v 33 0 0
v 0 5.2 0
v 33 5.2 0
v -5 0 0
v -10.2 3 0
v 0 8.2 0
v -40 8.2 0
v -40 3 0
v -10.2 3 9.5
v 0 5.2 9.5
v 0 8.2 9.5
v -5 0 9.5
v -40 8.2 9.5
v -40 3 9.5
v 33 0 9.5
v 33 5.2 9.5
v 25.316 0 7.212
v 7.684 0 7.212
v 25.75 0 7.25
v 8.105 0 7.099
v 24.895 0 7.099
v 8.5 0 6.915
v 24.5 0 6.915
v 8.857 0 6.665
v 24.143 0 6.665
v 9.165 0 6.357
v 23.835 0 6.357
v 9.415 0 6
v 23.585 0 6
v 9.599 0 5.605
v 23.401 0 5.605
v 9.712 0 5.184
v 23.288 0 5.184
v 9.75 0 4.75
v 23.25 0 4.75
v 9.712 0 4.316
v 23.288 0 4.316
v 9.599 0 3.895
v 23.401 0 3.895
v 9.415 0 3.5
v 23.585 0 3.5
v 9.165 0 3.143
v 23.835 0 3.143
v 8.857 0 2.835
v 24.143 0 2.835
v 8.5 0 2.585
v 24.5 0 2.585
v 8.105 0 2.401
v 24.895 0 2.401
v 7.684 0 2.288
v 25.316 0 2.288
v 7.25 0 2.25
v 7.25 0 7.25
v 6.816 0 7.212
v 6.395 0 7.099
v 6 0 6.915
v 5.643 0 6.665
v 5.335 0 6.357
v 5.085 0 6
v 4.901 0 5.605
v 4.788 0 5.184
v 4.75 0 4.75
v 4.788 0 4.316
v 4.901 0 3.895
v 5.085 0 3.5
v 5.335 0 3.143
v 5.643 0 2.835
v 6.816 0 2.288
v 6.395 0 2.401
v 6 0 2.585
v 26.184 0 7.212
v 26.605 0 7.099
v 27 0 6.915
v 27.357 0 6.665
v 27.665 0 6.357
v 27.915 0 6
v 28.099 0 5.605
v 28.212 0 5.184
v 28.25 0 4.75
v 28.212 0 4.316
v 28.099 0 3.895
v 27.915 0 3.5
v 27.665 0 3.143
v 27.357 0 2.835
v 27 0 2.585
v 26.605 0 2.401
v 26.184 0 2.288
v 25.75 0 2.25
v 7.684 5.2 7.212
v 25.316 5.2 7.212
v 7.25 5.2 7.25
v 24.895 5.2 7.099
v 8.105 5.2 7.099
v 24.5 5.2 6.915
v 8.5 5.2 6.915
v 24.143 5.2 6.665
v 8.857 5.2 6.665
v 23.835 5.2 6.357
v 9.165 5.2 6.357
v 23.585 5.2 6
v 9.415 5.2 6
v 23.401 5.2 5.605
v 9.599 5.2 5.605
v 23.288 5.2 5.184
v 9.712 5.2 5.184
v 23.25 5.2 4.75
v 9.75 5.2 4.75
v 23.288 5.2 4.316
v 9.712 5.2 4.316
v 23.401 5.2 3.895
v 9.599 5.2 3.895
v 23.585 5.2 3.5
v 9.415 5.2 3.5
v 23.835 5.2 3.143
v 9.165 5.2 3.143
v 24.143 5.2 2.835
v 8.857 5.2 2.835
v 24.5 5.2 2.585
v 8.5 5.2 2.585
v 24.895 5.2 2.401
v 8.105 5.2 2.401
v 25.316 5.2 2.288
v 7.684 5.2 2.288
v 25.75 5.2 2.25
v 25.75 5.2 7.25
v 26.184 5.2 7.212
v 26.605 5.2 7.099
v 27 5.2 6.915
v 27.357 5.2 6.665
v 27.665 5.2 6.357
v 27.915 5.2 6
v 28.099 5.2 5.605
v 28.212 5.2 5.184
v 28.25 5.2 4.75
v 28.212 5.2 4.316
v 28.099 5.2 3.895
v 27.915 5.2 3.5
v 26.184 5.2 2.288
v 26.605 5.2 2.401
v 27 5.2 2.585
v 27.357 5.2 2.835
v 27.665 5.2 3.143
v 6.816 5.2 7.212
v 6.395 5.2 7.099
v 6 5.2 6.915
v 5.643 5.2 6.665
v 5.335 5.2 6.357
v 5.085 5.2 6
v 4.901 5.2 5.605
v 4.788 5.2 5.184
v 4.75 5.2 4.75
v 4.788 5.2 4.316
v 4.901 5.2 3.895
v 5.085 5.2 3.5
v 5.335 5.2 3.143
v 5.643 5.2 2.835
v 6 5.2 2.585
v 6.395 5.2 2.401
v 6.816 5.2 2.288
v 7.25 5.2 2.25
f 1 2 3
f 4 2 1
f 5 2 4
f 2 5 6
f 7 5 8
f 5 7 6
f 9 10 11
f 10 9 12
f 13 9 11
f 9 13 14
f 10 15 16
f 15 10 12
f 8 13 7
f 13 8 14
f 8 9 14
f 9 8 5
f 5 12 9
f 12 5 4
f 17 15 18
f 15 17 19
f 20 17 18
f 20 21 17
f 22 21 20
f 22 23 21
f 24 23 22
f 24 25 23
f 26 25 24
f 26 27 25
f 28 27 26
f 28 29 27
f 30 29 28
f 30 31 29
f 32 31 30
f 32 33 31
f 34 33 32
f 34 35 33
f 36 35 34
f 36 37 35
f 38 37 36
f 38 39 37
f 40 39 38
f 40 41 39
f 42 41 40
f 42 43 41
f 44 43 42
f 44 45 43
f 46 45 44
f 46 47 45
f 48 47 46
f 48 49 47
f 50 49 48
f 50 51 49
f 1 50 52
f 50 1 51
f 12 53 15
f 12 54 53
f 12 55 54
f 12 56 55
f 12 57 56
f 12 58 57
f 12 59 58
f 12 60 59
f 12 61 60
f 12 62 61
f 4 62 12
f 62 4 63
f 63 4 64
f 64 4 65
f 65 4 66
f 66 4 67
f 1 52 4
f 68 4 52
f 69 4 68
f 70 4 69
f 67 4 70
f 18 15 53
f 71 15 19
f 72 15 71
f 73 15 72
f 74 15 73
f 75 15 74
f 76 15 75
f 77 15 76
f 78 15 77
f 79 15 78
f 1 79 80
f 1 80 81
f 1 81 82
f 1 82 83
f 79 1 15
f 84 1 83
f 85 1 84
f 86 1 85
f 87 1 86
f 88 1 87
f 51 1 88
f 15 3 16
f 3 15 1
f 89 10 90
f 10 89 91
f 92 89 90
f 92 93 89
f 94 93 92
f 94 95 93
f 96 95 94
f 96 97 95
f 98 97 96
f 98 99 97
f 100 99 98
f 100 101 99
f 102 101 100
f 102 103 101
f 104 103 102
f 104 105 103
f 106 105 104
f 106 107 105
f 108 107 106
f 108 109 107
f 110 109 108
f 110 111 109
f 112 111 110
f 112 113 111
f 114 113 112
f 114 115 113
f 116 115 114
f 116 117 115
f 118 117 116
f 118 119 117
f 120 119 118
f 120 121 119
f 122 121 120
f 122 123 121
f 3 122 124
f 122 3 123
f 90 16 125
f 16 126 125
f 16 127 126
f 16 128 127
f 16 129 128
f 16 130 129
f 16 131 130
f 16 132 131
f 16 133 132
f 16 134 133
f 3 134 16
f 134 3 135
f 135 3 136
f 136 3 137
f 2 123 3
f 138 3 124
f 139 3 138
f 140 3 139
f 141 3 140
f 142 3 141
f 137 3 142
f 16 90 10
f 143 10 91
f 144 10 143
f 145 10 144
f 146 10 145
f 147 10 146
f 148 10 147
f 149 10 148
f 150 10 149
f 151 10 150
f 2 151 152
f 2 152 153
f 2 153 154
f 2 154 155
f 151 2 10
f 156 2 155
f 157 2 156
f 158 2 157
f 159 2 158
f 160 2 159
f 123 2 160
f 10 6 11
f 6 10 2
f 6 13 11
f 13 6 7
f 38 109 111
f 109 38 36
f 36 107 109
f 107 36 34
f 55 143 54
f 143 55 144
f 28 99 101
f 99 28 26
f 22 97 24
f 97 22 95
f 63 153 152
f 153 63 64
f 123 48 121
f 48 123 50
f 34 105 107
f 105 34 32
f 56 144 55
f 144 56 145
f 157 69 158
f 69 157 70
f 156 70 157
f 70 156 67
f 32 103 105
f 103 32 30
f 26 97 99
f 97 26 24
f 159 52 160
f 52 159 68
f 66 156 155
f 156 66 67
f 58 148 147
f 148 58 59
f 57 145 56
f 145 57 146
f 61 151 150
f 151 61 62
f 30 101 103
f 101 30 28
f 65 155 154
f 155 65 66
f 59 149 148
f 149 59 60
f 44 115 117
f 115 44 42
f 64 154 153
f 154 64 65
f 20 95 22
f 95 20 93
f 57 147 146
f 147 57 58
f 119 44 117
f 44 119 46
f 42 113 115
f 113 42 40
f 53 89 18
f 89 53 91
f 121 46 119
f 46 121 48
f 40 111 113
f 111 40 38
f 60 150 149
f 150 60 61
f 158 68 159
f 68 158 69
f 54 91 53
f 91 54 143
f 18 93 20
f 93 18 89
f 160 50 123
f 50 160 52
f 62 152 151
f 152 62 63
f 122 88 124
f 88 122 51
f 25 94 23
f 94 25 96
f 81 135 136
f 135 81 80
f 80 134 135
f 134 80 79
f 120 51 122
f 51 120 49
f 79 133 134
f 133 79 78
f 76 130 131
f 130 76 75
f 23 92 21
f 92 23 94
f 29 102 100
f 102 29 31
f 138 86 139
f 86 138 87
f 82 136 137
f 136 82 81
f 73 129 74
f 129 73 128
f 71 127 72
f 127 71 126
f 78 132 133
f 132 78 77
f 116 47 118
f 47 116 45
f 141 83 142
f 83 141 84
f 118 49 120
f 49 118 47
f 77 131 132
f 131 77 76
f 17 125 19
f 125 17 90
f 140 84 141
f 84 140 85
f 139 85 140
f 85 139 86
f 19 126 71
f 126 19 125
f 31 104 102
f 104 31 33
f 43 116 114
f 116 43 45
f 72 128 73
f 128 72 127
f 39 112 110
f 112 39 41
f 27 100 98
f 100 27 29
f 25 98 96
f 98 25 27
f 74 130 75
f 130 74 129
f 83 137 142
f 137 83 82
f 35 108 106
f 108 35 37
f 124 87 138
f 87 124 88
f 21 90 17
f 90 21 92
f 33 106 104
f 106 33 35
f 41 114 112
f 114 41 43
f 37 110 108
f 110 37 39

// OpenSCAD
// Customizable Ord Bot Z-Wobble Suppressor

// CUSTOMIZER VARIABLES

$fn=36;

// Height of suppressor
height=9.5;
// Thickness of parts (This is the width of the makerslide gap)
thickness=5.2;
// Width of plate which will mount to your Z screw
mount_width=33;
// Offset between mount plate and arm.
offset=3;
// Length of arm, this needs to reach the makerslide gap.
arm_length=40;
// Diameter of screw holes.
hole_diameter=5.0;
// Separation between screw holes (center to center).
hole_separation=18.5;

difference(){
	linear_extrude(height=height){
		union(){
			// mount plate
			square([mount_width, thickness]);
			// anti-wobble arm
			translate([-arm_length,offset,0]) square([arm_length,thickness]);
		
			// attach them
			polygon(points=[[-5-thickness,offset],[0,offset+thickness],[0,thickness],[0,0], [-5,0]],paths=[ [0,1,2,3,4,5] ]);
		}
	}
	rotate([-90,0,0]) translate([(mount_width-(hole_separation))/2,0,0]) translate([0,-height/2,-1]) cylinder(r=hole_diameter/2, h=thickness+2);
	rotate([-90,0,0]) translate([(mount_width-(hole_separation))/2 + (hole_separation),0,0]) translate([0,-height/2,-1]) cylinder(r=hole_diameter/2, h=thickness+2);
}
